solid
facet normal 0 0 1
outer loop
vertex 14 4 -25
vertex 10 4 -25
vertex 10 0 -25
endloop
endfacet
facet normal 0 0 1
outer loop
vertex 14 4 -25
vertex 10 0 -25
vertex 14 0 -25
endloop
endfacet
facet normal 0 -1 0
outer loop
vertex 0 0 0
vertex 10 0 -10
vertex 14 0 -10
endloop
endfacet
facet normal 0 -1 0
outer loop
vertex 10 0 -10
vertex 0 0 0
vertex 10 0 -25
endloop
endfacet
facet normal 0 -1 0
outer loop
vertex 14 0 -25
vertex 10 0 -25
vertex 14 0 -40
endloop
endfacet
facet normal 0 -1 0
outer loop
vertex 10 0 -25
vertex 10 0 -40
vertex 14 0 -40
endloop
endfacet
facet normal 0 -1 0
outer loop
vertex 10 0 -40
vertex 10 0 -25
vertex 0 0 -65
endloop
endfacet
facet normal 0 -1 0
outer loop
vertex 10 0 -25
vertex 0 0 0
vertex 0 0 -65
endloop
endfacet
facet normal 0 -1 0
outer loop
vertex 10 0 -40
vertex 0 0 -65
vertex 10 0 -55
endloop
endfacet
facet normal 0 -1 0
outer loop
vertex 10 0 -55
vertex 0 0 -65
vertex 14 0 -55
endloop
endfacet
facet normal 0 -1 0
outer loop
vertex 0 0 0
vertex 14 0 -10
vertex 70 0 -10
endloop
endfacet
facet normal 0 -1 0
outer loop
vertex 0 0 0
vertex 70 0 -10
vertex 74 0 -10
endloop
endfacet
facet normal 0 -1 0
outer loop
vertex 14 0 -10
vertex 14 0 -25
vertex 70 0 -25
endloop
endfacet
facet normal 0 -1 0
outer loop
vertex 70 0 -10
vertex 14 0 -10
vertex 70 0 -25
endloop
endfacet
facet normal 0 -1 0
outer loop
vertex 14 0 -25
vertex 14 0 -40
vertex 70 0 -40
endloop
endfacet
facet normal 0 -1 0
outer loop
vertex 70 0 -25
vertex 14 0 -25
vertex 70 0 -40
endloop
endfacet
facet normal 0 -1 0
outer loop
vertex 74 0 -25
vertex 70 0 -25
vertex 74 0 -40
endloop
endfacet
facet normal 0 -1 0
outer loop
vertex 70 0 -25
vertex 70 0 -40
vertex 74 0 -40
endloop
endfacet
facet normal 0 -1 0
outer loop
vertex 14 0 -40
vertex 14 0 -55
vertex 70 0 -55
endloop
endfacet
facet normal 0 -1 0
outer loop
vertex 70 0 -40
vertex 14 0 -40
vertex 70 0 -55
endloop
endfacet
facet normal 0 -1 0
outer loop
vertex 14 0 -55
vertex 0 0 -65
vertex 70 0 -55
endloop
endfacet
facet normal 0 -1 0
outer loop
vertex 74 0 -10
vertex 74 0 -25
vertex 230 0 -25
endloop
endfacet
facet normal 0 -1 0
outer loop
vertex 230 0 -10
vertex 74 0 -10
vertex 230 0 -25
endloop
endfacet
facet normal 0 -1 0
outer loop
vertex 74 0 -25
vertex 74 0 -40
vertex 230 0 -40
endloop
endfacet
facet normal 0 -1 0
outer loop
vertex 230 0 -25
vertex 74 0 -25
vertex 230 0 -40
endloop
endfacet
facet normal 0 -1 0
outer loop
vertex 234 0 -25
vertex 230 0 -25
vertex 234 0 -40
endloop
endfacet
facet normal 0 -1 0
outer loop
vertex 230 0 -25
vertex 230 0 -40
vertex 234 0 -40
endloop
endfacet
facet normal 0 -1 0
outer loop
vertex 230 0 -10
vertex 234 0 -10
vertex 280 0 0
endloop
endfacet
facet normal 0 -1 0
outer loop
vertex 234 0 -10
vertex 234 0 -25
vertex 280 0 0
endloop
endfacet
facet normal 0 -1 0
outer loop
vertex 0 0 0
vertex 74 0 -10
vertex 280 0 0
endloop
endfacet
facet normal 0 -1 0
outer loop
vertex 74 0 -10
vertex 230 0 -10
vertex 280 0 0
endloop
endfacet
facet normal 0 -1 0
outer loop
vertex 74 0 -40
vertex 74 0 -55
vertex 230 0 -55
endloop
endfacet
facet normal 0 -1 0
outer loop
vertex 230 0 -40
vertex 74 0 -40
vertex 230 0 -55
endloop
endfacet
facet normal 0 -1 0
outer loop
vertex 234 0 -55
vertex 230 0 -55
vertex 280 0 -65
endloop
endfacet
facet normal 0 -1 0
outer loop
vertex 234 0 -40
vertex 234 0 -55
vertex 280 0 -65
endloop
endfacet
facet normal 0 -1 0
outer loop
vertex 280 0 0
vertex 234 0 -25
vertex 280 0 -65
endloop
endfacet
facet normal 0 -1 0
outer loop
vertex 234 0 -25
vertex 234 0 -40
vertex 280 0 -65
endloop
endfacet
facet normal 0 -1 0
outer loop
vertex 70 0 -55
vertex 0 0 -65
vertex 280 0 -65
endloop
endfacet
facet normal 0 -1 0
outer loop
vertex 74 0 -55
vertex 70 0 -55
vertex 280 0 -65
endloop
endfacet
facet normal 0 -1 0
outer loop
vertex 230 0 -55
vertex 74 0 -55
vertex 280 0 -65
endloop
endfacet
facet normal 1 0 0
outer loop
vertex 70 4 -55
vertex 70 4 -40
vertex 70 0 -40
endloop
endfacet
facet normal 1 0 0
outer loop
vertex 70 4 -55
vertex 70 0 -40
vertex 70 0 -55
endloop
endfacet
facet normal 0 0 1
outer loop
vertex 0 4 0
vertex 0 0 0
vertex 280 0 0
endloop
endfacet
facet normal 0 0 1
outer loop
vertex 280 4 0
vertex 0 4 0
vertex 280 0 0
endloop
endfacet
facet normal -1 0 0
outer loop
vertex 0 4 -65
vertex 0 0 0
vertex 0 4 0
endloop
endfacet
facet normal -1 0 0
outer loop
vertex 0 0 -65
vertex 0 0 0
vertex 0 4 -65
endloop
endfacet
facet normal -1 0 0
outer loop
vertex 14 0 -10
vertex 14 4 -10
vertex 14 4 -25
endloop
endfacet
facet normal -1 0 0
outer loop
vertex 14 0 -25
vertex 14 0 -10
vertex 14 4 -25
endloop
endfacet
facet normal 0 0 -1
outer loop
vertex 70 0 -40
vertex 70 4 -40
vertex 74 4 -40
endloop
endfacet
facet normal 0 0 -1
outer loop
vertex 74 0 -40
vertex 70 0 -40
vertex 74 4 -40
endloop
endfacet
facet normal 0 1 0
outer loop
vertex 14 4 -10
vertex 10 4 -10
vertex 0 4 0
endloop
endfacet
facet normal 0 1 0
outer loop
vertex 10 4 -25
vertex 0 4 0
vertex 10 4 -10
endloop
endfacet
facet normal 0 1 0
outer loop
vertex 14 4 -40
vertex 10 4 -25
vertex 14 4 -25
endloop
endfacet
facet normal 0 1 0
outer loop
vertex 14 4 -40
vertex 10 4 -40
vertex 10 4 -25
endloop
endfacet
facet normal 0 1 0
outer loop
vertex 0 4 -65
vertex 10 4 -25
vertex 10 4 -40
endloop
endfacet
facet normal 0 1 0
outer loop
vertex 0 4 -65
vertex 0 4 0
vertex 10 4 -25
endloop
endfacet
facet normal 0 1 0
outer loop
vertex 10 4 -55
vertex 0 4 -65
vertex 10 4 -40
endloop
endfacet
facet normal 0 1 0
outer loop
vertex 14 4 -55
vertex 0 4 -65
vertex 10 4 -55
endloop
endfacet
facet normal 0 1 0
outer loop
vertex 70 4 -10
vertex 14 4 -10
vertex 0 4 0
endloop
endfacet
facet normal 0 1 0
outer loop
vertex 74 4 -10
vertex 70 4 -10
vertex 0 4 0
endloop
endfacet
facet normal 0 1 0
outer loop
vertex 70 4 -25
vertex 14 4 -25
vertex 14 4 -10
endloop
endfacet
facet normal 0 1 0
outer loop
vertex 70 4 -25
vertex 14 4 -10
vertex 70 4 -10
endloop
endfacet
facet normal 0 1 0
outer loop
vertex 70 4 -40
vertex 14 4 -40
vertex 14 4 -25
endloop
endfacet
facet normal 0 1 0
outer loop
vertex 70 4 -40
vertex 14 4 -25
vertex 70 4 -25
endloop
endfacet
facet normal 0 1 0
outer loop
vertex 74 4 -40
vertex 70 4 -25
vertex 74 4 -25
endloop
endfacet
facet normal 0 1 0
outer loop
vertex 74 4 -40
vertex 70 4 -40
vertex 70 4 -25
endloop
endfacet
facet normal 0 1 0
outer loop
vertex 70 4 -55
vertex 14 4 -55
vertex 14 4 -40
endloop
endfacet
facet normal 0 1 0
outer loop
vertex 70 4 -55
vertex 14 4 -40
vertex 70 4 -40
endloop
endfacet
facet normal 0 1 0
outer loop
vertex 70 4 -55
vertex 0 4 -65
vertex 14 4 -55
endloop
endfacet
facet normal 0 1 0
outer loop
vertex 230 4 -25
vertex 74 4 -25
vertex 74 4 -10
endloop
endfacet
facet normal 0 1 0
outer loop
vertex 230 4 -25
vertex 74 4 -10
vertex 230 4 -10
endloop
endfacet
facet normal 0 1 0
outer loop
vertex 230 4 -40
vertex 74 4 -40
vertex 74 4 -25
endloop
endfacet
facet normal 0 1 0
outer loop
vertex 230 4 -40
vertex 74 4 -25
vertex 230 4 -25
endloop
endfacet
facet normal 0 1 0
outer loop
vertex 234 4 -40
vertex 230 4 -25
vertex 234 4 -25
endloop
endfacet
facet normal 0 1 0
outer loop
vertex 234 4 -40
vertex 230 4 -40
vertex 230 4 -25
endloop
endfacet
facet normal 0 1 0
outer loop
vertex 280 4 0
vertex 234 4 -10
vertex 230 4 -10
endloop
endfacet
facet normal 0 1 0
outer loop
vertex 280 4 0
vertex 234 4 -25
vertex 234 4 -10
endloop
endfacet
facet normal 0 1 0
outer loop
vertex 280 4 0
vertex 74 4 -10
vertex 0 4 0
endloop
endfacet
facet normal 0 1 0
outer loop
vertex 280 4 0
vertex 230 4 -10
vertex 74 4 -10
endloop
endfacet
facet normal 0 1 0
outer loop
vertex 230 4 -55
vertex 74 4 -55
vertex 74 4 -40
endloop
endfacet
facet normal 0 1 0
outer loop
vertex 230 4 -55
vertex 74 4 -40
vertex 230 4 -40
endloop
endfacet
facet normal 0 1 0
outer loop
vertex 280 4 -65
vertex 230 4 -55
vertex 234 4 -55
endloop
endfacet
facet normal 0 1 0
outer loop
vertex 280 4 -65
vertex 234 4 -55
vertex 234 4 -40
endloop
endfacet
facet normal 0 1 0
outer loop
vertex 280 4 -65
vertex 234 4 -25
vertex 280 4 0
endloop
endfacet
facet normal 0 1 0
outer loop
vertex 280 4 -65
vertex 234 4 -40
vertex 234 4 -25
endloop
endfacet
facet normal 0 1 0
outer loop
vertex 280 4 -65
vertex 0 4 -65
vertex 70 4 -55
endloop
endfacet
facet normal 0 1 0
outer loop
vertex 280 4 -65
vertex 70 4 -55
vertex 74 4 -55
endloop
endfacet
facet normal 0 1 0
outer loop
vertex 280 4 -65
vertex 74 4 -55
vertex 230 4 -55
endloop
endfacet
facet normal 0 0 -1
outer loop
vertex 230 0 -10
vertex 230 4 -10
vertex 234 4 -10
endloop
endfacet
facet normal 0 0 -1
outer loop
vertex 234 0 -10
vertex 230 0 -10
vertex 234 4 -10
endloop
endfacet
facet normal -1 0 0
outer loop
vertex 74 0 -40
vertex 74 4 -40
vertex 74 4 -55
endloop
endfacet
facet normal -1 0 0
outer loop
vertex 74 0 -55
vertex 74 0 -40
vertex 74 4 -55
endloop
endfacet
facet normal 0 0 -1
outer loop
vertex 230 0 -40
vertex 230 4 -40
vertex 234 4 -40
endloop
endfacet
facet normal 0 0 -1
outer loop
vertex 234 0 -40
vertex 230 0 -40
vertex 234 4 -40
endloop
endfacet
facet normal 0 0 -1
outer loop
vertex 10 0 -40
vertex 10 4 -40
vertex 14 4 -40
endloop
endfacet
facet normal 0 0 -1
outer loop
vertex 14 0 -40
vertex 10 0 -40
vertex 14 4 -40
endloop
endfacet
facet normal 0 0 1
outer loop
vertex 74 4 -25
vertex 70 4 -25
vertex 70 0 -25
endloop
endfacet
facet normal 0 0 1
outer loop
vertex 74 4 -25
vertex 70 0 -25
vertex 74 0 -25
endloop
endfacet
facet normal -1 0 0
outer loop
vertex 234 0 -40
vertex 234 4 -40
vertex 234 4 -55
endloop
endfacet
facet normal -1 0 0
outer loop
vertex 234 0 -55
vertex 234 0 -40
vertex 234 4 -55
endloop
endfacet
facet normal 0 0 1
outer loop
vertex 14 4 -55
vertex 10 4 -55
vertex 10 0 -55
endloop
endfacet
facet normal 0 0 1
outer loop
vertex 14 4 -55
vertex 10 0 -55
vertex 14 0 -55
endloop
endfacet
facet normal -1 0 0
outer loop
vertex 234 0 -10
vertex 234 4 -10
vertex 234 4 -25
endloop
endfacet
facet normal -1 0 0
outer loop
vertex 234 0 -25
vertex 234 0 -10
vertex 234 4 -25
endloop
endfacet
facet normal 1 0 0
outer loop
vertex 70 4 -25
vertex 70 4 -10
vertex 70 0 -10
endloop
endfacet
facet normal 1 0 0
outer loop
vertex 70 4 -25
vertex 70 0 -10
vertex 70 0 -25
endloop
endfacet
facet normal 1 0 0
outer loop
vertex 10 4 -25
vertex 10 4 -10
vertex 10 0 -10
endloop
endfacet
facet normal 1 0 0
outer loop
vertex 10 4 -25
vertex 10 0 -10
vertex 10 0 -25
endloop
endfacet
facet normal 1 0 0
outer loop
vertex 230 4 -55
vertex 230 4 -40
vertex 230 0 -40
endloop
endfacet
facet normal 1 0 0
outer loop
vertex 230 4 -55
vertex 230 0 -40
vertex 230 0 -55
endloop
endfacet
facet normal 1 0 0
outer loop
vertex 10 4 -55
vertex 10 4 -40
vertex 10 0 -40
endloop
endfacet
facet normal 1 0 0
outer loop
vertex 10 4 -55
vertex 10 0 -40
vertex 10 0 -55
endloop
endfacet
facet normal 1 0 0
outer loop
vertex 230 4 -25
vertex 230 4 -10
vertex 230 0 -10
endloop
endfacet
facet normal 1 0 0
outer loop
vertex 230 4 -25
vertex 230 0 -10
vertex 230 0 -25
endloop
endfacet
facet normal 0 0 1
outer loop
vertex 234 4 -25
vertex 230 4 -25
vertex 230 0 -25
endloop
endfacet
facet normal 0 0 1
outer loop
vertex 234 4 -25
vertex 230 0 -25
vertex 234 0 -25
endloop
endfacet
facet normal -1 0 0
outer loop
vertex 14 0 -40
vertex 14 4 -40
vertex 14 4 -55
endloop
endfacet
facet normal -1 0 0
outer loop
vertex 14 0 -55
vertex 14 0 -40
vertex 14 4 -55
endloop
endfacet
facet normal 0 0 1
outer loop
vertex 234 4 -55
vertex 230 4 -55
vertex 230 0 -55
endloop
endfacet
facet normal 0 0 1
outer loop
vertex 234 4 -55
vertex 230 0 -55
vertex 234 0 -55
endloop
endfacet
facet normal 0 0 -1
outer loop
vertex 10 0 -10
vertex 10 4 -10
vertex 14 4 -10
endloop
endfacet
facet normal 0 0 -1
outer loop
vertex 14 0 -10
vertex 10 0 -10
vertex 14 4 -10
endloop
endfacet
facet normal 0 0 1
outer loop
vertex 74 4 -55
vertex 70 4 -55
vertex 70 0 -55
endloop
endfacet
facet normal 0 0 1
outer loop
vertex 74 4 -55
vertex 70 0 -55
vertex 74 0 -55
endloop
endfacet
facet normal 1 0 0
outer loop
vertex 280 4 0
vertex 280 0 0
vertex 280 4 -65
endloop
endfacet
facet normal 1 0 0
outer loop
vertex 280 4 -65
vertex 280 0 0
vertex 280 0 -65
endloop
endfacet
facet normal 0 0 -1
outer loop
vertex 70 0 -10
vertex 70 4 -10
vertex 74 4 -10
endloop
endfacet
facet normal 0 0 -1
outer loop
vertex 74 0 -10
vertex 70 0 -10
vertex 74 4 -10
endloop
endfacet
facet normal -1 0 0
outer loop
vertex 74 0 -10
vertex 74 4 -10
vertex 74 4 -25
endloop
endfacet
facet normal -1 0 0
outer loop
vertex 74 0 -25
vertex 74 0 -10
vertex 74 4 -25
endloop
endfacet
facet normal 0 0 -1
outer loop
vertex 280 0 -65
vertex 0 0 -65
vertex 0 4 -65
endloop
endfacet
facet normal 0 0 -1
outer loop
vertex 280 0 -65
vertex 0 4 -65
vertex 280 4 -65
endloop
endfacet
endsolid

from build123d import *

# Parameters (mm, degrees)
SKETCH1_W           = 280
SKETCH1_H           = 65
BOSS_EXTRUDE1_DEPTH = 4
SKETCH2_W           = 4
SKETCH2_H           = 15
CUT_EXTRUDE1_DEPTH  = 4


with BuildPart() as part:
    # Sketch1 → Boss-Extrude1 (new body)
    with BuildSketch(Plane(origin=(0, 0, 0), x_dir=(1, 0, 0), z_dir=(0, 1, 0))):
        with Locations((140, 32.5)):
            Rectangle(SKETCH1_W, SKETCH1_H)
    extrude(amount=BOSS_EXTRUDE1_DEPTH)

    # Sketch2 → Cut-Extrude1 (cut)
    with BuildSketch(Plane(origin=(0, 4, 0), x_dir=(1, 0, 0), z_dir=(0, 1, 0))):
        with Locations((12, 47.5)):
            Rectangle(SKETCH2_W, SKETCH2_H)
        with Locations((12, 17.5)):
            Rectangle(SKETCH2_W, SKETCH2_H)
        with Locations((72, 17.5)):
            Rectangle(SKETCH2_W, SKETCH2_H)
        with Locations((72, 47.5)):
            Rectangle(SKETCH2_W, SKETCH2_H)
        with Locations((232, 47.5)):
            Rectangle(SKETCH2_W, SKETCH2_H)
        with Locations((232, 17.5)):
            Rectangle(SKETCH2_W, SKETCH2_H)
    extrude(amount=-CUT_EXTRUDE1_DEPTH, mode=Mode.SUBTRACT)


solid = part.part
